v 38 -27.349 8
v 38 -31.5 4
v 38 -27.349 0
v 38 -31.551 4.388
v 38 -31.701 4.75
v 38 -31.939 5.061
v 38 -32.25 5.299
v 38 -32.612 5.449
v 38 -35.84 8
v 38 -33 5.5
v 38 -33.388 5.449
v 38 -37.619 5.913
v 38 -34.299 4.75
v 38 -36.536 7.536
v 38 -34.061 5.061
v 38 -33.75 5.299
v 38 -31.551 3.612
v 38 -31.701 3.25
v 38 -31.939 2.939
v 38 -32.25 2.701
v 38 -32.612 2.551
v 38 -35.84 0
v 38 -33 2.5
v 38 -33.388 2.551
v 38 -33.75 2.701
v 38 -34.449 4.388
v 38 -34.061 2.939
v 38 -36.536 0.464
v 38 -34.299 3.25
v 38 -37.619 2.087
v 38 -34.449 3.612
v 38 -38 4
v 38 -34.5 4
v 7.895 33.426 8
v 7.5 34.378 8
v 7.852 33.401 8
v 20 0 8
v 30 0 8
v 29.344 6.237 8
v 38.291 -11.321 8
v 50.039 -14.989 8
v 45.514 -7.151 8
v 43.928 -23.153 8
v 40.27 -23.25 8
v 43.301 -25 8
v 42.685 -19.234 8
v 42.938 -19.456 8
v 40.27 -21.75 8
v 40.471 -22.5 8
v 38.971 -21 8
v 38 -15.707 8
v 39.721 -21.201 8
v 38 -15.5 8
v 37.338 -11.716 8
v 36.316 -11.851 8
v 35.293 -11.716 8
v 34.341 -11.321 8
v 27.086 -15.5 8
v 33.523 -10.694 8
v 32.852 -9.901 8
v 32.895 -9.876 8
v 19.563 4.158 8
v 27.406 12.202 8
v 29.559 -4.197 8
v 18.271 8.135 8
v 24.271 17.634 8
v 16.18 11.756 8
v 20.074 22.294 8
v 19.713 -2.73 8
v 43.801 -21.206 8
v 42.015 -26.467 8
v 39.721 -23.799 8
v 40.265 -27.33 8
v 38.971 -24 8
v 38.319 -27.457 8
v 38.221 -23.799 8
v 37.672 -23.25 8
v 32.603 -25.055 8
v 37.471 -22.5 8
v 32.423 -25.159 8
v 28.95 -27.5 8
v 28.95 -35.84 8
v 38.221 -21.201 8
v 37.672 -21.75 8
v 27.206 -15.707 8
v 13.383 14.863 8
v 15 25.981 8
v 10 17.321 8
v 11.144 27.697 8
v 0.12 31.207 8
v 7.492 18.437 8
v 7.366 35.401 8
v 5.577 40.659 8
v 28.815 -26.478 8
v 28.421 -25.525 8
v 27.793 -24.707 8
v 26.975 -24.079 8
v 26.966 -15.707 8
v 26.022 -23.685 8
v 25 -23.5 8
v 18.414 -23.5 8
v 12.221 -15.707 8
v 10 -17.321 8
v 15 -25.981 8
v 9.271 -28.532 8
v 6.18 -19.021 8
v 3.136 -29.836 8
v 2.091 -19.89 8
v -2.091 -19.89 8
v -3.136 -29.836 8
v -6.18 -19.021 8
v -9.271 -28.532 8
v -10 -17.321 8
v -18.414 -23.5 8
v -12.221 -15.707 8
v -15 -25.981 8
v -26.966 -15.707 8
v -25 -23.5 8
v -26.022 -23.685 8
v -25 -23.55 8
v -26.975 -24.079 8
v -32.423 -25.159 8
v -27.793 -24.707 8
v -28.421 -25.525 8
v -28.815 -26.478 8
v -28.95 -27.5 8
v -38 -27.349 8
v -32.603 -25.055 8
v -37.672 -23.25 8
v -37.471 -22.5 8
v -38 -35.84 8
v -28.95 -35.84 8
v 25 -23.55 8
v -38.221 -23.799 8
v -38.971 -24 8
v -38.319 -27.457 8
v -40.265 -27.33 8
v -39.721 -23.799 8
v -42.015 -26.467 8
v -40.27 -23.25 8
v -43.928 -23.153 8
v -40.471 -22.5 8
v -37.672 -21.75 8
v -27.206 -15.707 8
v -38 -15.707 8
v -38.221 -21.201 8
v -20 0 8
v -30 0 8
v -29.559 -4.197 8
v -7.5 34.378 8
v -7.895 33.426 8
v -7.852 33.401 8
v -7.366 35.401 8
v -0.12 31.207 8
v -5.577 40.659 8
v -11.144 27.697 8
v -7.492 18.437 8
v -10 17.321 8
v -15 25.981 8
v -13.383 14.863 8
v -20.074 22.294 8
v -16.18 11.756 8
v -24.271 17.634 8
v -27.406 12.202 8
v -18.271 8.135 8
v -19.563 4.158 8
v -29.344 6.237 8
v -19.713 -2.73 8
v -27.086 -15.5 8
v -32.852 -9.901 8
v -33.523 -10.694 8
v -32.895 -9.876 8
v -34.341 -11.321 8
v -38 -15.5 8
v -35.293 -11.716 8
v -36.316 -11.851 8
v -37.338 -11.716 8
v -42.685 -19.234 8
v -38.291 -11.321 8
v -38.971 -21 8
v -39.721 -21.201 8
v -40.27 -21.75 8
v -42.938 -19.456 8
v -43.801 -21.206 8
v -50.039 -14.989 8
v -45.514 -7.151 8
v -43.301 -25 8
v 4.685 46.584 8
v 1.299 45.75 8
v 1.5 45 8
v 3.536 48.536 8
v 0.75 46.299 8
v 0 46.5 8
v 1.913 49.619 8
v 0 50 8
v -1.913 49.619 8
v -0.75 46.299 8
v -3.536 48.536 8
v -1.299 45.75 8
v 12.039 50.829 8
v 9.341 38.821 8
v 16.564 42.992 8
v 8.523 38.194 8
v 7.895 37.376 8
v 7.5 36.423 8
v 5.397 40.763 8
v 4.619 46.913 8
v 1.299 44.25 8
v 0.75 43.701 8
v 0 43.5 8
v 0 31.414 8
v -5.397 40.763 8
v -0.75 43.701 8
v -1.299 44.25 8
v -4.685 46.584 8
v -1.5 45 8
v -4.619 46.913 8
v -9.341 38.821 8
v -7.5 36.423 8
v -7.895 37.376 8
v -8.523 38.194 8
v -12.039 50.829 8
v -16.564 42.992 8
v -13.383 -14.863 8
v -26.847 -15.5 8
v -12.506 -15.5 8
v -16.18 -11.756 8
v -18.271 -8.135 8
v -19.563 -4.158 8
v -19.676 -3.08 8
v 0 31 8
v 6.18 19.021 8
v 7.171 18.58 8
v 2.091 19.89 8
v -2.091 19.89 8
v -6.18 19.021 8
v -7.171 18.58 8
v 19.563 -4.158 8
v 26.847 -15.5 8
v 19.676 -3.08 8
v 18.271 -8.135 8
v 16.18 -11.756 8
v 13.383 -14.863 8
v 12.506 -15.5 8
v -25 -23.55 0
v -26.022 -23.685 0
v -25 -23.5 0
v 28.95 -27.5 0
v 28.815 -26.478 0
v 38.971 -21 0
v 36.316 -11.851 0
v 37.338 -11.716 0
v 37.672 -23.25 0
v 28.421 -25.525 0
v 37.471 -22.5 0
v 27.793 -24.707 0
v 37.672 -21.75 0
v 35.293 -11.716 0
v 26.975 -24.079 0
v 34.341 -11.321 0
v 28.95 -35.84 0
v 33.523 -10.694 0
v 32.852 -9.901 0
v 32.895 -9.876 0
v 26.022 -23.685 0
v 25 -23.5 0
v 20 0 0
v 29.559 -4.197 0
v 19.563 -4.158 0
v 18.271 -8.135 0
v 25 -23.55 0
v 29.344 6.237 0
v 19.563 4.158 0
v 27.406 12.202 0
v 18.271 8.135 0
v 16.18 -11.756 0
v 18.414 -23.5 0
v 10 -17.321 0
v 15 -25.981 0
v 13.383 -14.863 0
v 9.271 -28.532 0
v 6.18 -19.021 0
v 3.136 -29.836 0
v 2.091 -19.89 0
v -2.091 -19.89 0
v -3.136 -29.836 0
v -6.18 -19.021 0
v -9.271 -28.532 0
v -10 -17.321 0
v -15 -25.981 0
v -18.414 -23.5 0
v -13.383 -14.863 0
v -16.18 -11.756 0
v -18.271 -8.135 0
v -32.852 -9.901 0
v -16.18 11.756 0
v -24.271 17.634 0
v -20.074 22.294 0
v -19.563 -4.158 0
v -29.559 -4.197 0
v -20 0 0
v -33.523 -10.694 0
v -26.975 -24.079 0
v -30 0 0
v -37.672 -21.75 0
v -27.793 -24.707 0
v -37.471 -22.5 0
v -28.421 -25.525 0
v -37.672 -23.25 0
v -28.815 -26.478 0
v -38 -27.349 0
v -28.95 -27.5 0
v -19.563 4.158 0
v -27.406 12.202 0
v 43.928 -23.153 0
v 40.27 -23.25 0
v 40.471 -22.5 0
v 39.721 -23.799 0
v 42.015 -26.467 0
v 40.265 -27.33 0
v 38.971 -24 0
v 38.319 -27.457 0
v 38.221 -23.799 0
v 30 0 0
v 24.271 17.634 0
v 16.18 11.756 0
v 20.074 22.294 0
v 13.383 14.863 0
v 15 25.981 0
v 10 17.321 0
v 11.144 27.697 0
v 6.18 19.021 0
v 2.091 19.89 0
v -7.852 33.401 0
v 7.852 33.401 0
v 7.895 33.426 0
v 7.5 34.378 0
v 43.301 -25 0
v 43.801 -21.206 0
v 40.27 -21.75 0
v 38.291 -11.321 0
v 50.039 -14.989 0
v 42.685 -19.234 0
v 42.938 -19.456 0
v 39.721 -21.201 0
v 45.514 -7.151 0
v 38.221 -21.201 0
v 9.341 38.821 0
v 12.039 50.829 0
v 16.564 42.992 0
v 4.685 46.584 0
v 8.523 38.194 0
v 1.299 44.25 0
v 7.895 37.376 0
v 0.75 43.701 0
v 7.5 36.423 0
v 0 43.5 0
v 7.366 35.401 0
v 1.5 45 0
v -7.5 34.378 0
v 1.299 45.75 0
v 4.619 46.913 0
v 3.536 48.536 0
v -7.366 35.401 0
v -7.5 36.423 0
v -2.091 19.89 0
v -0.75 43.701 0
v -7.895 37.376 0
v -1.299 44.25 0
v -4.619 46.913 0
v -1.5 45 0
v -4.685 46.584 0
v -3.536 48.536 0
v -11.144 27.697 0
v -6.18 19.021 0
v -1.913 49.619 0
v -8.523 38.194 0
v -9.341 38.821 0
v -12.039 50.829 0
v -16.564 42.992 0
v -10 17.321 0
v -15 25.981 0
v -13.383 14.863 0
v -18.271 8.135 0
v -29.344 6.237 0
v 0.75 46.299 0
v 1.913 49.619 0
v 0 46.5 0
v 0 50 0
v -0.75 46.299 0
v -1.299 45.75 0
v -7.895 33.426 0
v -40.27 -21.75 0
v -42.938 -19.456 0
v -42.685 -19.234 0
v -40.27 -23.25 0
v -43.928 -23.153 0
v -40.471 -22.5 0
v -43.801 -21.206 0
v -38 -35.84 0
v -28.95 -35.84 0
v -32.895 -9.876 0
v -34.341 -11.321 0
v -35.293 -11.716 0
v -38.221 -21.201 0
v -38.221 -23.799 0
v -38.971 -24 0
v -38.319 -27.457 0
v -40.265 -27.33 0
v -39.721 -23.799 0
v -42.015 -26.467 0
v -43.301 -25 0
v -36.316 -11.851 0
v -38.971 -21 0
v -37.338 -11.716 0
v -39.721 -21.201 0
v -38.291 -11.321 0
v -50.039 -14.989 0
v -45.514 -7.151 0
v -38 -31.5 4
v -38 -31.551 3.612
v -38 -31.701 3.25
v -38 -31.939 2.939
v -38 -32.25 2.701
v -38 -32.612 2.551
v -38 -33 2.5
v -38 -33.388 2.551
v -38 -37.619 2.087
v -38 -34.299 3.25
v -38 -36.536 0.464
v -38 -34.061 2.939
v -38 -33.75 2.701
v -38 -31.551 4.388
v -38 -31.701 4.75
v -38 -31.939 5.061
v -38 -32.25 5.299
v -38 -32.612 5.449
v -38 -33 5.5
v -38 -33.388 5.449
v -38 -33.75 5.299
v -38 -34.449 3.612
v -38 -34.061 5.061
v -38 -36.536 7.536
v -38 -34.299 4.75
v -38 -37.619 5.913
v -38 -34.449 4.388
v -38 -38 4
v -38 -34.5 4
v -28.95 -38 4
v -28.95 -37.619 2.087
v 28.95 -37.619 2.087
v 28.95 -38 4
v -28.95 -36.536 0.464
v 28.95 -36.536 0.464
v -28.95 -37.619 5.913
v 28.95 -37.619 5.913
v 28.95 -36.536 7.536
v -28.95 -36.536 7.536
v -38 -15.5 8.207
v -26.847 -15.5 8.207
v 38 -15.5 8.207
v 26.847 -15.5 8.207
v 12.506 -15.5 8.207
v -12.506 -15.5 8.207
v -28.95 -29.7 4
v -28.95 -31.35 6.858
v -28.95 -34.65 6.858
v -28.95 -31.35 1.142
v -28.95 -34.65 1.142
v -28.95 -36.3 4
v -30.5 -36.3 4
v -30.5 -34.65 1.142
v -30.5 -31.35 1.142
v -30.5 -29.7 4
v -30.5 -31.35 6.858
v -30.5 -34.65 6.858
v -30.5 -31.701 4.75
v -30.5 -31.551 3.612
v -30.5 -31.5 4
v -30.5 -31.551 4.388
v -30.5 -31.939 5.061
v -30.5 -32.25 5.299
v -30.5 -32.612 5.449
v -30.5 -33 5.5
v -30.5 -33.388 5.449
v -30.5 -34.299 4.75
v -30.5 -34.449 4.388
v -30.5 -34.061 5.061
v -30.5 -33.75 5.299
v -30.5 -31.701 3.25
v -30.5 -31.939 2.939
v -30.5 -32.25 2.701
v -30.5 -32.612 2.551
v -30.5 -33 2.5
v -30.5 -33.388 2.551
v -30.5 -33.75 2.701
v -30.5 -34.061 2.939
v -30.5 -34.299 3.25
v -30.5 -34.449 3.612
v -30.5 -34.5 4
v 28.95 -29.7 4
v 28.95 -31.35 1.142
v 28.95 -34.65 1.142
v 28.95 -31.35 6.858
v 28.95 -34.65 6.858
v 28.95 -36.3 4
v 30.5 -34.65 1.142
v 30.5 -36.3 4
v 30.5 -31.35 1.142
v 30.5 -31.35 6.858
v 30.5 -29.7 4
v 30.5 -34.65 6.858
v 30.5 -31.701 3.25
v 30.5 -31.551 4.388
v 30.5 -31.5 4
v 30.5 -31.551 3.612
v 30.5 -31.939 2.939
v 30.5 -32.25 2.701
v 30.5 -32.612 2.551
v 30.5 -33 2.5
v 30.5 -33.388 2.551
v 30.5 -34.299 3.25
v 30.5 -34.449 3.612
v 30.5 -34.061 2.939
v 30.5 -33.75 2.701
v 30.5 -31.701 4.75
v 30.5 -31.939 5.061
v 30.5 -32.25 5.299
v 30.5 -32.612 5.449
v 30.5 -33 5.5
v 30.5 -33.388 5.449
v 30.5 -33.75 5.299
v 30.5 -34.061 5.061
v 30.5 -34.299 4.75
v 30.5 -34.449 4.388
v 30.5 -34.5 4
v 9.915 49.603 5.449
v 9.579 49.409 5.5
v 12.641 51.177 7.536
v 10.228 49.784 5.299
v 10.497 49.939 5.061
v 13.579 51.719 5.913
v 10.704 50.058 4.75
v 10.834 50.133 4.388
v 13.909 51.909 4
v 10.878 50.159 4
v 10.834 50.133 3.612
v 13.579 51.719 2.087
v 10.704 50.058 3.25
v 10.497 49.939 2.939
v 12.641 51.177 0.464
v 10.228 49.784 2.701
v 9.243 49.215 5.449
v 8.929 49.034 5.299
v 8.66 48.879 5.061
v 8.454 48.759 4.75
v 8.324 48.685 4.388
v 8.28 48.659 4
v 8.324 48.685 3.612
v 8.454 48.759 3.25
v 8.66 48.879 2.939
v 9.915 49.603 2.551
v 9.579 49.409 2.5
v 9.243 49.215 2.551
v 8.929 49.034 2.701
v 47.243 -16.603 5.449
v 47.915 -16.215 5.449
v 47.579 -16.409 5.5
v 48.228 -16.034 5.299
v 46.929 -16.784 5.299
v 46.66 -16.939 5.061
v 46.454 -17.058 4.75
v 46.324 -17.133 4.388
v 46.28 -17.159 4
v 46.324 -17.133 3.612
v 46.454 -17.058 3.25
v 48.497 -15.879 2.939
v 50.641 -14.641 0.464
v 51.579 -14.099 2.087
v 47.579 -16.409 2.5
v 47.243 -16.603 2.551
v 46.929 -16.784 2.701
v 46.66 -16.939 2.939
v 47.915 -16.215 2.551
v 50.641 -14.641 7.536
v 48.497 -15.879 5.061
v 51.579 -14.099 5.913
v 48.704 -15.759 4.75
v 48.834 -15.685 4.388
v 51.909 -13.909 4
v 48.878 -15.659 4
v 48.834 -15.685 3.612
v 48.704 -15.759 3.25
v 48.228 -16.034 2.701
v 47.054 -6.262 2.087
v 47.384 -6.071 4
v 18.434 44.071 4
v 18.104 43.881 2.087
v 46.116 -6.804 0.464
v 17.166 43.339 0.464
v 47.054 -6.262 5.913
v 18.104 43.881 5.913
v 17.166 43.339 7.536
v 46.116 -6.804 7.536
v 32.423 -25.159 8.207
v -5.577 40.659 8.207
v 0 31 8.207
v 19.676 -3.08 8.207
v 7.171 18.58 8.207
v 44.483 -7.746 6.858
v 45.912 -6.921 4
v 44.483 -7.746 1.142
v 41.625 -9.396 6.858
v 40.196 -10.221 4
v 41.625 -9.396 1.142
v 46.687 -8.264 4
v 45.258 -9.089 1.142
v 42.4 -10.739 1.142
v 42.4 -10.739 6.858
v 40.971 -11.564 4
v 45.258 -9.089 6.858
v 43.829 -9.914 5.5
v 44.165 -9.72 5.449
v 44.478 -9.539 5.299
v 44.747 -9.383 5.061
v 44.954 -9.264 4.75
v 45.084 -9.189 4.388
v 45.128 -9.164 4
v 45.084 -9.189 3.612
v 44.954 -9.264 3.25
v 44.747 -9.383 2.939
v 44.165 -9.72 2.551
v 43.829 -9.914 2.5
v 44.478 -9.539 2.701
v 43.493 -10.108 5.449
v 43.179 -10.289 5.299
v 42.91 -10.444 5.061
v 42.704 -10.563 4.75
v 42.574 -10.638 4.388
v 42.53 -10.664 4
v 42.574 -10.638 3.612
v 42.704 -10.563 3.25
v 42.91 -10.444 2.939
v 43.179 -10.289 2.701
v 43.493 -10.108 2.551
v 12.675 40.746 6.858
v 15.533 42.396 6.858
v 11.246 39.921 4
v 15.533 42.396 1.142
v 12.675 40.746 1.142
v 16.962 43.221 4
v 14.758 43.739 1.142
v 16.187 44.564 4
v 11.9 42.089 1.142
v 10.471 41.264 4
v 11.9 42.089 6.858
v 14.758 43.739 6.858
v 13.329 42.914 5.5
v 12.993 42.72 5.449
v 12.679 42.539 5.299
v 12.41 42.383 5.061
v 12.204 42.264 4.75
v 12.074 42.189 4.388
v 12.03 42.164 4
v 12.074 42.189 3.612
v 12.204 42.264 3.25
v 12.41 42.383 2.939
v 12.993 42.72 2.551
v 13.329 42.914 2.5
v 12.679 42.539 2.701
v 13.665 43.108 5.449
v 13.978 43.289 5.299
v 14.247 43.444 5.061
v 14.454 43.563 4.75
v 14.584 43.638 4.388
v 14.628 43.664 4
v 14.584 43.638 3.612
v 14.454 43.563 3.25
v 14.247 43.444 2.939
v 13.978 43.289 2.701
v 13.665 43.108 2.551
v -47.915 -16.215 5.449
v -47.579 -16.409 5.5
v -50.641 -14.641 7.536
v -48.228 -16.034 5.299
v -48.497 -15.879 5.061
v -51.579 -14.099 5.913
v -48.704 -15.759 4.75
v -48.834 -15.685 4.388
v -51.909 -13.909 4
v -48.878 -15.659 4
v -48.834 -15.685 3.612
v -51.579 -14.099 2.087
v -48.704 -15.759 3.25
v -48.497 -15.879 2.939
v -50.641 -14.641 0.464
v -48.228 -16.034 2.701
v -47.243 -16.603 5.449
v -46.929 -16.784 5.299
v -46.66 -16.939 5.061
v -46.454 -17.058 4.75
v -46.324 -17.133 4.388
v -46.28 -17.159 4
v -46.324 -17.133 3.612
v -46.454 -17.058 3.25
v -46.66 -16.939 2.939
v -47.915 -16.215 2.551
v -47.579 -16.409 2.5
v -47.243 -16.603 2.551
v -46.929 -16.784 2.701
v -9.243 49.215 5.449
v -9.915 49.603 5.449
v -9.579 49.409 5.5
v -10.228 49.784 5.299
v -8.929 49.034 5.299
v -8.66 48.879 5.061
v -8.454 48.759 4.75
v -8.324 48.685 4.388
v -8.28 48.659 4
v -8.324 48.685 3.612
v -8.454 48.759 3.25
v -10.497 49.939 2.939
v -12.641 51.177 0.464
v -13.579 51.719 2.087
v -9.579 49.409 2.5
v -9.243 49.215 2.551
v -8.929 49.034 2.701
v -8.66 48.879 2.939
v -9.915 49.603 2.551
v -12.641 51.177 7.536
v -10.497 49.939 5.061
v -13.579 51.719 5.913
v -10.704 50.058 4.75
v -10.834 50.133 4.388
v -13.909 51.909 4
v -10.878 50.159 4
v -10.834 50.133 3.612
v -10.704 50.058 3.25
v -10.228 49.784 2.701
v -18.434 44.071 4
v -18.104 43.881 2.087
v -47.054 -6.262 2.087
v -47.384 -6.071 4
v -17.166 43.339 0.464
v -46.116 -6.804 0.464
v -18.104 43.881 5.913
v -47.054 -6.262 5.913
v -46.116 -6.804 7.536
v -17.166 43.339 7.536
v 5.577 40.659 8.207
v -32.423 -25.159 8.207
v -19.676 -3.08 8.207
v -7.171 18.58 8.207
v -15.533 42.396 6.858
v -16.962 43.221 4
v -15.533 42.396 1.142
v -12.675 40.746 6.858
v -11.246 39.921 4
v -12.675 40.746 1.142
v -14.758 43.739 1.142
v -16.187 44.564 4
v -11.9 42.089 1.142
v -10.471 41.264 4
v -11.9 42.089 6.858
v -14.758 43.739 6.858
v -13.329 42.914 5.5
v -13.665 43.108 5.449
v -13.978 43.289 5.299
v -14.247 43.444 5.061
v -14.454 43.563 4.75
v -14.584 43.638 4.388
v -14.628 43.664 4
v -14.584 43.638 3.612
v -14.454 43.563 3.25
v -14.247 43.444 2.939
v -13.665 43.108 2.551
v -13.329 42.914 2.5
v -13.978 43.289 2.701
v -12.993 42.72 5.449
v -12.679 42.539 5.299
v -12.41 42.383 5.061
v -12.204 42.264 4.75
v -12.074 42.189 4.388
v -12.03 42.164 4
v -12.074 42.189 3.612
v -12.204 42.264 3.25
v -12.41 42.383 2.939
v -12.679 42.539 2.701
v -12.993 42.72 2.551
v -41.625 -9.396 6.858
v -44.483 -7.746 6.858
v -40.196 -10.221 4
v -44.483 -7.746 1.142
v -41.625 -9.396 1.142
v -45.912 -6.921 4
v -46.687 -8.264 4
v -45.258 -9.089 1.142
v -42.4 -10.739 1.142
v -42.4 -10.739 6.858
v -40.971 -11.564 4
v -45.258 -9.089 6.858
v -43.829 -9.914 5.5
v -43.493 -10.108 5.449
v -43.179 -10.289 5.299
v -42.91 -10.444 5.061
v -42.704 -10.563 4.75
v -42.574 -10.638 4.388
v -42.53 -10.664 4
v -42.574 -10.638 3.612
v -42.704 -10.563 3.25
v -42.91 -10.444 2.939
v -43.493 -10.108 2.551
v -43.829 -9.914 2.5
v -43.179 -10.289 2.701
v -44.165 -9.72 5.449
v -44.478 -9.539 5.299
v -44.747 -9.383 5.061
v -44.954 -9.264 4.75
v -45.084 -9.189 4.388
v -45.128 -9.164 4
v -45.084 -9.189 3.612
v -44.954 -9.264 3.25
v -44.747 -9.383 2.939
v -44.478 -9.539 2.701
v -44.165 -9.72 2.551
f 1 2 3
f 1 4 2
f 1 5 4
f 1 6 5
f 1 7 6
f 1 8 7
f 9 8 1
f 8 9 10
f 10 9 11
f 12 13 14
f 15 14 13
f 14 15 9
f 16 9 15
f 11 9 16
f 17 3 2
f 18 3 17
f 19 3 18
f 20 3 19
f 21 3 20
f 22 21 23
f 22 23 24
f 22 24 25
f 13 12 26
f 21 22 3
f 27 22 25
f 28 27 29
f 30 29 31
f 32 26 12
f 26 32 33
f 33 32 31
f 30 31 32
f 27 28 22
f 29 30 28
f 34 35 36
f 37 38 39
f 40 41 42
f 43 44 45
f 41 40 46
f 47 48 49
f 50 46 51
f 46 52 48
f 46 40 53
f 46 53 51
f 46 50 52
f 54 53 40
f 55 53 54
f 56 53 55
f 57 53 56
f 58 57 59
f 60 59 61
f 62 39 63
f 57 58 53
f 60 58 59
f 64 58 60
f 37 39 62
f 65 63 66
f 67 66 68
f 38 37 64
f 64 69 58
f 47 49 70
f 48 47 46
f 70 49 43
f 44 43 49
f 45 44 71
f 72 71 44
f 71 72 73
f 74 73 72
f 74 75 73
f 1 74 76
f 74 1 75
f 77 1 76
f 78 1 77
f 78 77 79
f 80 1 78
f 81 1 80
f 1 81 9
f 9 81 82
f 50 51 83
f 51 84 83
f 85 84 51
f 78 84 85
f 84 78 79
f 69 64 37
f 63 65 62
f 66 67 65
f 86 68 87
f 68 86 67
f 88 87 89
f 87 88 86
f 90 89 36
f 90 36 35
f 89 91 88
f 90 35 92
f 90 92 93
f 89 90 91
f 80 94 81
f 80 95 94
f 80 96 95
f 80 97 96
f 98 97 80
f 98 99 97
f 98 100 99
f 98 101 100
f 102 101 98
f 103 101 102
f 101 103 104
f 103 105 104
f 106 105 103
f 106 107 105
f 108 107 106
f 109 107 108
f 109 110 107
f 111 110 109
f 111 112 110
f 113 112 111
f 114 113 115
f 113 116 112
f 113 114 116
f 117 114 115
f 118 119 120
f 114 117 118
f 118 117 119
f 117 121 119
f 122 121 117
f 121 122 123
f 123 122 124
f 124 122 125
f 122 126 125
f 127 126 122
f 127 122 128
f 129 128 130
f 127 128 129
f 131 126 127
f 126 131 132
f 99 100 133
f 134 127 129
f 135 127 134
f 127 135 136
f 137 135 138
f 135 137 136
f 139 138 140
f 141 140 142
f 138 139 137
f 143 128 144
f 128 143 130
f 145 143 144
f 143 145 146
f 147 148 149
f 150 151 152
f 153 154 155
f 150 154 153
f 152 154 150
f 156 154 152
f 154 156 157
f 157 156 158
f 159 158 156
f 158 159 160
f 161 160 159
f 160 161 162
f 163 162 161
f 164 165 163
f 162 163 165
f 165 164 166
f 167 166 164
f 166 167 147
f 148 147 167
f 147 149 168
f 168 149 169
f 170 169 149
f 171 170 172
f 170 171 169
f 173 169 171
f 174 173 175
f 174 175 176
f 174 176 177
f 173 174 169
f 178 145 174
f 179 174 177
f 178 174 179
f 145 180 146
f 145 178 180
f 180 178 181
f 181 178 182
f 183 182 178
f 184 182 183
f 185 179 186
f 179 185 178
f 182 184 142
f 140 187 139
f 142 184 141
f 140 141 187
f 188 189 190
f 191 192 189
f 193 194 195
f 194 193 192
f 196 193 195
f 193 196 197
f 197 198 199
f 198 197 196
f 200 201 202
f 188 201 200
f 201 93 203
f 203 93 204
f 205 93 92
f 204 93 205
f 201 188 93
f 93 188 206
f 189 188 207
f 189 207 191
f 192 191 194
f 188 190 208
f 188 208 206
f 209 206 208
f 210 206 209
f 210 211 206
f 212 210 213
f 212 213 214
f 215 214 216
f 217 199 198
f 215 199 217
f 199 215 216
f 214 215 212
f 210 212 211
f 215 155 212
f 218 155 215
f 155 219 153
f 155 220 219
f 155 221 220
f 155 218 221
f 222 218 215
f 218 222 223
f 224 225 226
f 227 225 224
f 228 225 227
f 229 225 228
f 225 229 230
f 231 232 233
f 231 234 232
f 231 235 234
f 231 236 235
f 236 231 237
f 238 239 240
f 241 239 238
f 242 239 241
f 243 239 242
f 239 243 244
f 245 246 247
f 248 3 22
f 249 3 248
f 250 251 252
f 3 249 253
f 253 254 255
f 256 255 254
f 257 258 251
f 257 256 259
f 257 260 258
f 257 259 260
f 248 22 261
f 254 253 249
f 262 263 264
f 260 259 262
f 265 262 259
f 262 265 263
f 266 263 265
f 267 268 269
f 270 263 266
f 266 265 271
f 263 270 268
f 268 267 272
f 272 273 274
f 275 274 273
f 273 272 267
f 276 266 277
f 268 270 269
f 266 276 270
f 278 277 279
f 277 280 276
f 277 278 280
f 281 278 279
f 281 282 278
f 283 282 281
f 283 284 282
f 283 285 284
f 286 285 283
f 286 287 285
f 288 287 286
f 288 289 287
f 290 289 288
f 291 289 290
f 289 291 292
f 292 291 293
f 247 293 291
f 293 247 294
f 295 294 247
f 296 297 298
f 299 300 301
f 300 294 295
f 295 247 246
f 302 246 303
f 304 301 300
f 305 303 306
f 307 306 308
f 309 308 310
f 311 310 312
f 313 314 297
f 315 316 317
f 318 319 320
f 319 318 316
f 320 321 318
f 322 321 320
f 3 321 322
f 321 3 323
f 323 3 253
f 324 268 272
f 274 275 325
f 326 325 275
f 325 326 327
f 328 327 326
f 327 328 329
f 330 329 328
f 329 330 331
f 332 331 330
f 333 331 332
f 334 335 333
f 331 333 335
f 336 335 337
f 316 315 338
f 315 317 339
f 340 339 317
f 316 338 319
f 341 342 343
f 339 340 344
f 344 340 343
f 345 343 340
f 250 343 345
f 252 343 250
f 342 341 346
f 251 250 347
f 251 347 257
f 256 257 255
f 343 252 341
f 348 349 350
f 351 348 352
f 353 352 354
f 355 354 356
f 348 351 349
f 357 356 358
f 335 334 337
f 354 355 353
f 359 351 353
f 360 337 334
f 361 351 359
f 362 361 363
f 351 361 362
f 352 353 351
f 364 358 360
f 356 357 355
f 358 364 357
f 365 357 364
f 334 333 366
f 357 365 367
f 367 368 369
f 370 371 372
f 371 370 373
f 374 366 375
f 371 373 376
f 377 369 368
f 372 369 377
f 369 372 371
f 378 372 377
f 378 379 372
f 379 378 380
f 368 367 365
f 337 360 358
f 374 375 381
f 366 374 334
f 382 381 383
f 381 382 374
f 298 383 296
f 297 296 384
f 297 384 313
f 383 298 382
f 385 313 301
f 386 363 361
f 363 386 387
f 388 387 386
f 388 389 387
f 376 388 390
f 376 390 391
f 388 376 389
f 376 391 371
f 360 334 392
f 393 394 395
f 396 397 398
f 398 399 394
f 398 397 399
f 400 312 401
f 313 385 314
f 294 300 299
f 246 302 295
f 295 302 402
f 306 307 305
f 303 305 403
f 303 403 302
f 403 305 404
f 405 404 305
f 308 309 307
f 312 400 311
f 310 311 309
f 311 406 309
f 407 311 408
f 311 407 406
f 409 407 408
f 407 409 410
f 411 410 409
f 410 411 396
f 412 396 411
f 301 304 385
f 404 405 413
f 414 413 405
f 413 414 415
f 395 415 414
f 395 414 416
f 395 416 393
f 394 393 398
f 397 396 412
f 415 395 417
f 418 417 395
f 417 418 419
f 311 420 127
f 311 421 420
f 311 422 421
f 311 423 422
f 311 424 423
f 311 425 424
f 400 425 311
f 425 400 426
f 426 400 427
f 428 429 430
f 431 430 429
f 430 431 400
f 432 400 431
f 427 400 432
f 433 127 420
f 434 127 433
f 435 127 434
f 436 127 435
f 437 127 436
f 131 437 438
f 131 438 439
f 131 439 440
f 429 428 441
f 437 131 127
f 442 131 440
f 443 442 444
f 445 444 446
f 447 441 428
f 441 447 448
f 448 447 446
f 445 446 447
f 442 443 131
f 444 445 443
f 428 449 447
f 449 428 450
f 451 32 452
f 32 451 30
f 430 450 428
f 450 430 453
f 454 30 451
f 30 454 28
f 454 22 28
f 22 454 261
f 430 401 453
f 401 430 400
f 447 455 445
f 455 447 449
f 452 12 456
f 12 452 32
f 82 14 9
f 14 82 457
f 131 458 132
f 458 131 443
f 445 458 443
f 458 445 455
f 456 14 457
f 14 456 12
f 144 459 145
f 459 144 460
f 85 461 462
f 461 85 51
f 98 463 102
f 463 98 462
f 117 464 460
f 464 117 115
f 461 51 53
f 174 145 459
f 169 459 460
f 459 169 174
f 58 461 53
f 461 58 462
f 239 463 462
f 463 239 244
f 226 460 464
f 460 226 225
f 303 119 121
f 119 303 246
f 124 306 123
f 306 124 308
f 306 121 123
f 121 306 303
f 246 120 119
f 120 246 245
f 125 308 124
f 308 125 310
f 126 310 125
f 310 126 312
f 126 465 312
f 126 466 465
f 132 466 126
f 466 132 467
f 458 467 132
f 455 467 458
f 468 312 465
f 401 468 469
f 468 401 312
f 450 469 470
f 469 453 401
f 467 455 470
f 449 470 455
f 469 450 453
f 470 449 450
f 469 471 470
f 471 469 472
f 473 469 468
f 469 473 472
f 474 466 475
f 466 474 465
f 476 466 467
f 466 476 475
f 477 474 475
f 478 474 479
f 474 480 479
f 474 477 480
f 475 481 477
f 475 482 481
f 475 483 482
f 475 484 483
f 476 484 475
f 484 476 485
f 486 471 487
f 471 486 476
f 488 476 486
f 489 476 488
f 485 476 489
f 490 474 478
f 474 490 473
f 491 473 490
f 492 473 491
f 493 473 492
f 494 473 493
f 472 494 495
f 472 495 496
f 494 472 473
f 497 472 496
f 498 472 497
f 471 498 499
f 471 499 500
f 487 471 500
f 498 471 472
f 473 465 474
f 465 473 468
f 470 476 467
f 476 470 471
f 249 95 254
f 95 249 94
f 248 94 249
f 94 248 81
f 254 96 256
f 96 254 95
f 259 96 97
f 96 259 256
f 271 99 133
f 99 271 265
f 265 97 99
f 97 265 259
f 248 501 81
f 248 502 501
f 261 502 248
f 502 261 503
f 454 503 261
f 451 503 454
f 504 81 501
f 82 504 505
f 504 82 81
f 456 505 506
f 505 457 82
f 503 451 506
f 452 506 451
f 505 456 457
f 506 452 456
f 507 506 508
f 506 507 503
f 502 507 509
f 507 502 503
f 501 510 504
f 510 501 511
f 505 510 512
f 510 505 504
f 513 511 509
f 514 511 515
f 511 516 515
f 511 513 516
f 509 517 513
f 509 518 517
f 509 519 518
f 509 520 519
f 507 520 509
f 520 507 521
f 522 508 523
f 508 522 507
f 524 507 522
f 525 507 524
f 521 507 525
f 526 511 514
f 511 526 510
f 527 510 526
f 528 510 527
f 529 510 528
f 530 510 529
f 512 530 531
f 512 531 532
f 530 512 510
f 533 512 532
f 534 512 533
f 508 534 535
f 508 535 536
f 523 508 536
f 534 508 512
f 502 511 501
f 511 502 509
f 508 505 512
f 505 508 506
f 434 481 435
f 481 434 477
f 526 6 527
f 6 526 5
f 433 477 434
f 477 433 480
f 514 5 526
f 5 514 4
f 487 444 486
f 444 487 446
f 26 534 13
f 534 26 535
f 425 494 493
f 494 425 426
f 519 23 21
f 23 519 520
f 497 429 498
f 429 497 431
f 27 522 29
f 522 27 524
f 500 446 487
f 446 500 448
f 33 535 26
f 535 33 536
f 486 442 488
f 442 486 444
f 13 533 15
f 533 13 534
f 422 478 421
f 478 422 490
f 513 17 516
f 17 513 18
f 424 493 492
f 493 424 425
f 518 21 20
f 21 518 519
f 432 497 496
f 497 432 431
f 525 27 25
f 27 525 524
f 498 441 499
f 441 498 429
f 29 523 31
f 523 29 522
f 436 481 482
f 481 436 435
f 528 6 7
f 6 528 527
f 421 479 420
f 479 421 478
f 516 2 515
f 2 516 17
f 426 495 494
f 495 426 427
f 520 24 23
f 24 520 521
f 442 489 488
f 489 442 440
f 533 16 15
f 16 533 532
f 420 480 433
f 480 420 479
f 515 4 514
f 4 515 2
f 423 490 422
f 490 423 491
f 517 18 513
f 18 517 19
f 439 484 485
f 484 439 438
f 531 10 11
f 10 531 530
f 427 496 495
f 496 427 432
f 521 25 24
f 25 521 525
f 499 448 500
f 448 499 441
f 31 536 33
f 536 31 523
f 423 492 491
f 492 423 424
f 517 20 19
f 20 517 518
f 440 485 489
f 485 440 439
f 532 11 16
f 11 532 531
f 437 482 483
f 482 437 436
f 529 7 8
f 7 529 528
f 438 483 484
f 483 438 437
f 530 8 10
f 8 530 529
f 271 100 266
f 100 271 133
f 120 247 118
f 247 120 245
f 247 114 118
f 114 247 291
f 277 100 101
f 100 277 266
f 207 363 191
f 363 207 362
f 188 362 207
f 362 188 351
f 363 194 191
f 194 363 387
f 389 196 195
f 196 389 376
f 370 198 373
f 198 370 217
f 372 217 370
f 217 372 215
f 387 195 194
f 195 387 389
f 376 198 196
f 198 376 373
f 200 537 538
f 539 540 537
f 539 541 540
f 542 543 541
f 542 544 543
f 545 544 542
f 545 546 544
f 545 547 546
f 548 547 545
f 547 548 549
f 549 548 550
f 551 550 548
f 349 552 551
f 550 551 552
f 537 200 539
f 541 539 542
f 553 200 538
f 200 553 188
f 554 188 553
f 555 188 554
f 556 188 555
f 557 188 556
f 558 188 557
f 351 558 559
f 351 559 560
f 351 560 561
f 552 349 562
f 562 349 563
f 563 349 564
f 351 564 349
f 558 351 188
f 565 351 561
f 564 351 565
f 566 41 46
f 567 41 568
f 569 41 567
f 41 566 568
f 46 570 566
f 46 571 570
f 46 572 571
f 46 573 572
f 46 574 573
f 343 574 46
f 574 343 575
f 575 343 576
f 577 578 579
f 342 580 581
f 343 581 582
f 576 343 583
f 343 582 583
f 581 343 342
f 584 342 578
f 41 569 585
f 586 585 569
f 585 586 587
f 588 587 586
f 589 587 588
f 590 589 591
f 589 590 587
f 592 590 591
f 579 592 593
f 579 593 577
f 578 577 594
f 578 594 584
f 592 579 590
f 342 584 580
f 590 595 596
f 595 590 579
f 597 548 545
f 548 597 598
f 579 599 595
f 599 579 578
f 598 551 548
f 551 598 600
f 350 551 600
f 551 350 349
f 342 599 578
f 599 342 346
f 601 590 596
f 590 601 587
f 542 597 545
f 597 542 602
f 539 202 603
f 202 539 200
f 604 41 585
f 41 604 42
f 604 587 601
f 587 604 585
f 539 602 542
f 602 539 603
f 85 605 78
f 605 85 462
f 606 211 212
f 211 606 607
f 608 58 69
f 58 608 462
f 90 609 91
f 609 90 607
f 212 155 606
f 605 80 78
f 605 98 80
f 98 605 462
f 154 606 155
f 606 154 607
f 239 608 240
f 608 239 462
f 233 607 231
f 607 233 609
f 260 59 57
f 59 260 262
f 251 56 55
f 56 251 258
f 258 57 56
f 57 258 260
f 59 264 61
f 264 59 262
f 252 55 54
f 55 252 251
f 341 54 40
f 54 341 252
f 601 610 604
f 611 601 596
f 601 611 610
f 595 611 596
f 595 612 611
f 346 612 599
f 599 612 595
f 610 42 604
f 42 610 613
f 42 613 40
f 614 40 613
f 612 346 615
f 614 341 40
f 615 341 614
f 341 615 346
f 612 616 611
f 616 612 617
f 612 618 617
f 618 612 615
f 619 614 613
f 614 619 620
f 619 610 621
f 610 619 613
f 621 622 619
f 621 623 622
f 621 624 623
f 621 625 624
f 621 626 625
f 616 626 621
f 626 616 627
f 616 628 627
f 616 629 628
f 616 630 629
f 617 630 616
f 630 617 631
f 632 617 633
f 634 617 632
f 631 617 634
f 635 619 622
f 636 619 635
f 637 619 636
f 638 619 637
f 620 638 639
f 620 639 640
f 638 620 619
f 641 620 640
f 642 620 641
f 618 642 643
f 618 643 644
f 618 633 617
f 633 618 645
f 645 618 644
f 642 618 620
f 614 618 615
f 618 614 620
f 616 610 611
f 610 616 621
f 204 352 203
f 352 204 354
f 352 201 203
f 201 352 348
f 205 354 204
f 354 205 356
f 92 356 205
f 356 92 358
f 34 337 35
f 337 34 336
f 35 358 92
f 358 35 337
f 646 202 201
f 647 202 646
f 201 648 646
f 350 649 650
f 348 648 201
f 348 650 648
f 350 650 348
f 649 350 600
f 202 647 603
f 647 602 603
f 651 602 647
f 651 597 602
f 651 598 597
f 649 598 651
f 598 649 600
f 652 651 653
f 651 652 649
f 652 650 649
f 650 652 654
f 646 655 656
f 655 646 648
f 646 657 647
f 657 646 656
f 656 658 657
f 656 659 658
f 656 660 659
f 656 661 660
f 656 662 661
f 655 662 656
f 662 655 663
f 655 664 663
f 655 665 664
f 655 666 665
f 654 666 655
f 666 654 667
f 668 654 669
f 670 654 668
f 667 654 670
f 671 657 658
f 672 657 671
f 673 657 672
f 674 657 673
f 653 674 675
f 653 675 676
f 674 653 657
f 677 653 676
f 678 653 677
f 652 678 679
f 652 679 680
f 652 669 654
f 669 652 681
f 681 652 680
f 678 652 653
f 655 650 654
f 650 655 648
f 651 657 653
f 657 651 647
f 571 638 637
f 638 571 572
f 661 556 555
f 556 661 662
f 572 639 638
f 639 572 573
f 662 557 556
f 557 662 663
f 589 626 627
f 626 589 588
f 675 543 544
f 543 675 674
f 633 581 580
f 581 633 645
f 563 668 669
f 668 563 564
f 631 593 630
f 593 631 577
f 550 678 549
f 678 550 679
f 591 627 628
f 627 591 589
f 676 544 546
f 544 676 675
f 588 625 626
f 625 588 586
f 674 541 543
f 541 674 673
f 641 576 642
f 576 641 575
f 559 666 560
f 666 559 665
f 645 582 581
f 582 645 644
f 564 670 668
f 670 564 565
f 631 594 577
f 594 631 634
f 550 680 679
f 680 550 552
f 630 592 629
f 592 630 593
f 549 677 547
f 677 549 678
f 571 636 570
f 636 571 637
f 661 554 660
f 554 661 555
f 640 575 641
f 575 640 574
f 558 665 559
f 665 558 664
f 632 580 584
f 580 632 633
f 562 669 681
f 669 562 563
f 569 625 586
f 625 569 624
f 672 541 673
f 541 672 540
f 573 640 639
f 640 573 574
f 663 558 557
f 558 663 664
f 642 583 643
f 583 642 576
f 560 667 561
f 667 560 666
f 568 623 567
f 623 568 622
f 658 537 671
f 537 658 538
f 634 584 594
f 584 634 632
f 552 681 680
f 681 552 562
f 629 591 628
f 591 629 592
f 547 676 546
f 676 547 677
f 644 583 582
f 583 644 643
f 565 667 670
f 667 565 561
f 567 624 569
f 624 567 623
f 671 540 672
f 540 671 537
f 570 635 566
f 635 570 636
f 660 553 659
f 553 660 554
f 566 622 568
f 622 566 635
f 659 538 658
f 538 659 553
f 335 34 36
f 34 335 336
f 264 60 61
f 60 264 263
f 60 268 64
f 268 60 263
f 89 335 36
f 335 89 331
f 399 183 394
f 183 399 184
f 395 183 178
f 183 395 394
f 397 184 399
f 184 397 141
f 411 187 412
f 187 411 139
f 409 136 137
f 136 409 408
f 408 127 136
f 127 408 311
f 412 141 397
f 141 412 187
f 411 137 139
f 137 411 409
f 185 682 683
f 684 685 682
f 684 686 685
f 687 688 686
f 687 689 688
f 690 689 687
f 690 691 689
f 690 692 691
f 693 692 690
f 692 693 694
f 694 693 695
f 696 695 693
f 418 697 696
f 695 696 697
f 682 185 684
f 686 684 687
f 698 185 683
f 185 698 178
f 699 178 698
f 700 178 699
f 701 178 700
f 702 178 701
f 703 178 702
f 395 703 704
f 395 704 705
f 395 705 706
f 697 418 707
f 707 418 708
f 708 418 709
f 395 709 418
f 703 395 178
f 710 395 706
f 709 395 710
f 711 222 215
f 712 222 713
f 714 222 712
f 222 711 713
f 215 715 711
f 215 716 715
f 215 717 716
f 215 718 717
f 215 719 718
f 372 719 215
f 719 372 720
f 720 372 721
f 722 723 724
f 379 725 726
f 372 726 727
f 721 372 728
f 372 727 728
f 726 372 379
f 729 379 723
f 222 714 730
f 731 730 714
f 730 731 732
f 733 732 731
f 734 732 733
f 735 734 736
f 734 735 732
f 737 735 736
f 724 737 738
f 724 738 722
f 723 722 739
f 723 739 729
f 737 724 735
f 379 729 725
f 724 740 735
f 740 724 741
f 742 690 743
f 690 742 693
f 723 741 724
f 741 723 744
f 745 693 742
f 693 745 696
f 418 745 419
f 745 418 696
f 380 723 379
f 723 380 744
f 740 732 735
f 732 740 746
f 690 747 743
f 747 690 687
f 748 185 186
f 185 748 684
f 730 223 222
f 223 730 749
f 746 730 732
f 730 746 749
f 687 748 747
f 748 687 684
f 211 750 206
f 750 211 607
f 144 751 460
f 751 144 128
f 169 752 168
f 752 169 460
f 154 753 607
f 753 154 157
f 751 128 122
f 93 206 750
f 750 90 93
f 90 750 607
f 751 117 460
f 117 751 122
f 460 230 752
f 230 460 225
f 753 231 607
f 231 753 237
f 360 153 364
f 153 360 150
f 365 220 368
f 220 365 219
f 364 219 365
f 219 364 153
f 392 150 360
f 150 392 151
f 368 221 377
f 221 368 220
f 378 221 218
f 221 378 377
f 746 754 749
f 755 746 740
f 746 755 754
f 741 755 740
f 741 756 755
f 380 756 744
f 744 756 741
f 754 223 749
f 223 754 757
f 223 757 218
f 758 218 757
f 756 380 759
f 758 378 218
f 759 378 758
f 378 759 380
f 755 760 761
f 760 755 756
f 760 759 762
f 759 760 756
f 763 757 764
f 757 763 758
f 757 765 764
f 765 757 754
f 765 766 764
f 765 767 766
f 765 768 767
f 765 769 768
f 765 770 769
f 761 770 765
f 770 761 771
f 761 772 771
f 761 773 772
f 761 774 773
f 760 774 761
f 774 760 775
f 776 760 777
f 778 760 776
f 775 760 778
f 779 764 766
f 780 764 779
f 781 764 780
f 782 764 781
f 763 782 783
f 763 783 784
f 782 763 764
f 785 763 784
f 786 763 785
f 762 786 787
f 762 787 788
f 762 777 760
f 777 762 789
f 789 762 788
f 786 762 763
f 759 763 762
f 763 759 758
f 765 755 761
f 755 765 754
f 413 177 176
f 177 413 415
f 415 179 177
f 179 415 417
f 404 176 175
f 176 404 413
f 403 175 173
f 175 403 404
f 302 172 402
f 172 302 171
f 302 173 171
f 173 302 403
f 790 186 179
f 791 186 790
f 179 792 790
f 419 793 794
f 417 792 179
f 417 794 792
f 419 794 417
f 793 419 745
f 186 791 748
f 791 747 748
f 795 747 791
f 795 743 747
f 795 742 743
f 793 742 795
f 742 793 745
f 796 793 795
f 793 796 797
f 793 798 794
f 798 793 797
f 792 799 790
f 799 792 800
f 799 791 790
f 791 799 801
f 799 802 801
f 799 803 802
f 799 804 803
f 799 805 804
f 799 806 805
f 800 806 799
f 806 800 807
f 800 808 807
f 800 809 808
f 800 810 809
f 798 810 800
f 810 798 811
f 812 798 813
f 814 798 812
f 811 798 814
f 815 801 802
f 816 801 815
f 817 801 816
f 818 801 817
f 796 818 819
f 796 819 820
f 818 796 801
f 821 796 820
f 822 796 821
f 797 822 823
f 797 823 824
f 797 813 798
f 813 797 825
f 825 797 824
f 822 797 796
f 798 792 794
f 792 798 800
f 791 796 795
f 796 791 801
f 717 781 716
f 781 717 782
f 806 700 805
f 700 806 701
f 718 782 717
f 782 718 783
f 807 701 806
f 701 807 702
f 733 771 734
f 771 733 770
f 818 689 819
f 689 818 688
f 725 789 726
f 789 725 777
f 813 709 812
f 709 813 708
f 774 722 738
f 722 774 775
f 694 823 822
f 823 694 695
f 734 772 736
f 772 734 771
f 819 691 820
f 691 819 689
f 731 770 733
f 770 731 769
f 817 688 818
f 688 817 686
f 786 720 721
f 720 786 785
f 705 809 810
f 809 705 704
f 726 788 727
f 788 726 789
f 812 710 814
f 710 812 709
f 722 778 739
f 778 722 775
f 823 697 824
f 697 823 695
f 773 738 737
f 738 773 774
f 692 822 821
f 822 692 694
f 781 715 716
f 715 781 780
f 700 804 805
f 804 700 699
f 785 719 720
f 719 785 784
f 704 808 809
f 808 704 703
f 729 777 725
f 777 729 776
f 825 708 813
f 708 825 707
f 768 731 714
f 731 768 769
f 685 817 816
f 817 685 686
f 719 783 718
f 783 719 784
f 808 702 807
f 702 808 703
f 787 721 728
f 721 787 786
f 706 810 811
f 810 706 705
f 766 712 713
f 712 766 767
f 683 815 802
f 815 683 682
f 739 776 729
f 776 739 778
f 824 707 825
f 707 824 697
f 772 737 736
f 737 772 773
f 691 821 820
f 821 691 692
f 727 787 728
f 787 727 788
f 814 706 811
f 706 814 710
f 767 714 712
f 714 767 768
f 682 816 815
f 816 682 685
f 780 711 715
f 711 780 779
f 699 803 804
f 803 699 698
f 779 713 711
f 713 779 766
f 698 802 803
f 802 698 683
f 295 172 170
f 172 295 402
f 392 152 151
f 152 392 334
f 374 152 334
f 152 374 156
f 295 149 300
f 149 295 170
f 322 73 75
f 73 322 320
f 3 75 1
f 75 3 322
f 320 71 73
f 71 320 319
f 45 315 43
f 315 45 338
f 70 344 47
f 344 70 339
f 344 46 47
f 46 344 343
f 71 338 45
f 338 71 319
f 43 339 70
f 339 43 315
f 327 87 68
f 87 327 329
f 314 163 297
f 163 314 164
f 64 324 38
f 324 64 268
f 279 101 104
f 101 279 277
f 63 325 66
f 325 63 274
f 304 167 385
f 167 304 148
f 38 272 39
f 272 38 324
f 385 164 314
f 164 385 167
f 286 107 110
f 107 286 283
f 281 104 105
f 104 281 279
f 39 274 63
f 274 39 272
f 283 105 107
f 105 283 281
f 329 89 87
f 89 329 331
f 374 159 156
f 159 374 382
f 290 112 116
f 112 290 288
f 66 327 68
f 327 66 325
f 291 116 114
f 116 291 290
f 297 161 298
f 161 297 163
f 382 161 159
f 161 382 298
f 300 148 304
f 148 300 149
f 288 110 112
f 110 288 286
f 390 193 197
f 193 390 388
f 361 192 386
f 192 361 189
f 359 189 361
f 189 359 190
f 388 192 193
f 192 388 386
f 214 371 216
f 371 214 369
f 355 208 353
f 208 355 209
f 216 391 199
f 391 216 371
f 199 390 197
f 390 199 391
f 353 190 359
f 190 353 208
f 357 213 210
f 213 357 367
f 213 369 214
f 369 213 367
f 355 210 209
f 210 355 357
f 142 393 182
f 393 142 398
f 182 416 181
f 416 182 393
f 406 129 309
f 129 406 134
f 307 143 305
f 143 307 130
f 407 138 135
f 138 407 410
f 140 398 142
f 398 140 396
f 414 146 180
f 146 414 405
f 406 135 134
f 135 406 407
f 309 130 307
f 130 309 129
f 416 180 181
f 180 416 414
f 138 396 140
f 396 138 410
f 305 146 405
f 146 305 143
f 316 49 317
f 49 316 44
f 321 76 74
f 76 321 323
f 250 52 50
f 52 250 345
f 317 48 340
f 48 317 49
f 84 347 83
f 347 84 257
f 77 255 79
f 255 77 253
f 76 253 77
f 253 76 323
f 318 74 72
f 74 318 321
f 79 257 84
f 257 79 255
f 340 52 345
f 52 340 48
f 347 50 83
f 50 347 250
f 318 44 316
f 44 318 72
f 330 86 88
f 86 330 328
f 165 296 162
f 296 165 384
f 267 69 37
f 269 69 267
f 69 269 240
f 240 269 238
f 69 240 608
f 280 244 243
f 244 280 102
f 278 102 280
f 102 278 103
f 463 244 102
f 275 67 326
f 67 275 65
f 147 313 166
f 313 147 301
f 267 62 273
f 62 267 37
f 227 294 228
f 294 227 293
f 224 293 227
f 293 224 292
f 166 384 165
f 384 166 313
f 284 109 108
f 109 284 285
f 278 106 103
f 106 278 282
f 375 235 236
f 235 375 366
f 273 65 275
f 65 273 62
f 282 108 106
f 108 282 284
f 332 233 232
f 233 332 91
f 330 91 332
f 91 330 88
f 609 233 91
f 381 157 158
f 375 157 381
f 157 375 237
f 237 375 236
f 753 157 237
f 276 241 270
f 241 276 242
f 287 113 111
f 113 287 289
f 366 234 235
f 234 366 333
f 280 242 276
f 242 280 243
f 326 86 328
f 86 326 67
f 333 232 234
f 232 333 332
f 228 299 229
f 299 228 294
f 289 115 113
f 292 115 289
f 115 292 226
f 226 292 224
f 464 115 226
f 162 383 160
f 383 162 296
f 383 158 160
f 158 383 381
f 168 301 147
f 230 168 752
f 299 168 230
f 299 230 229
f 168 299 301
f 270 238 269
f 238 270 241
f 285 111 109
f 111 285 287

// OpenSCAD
// file: carriage.scad
include <configuration.scad>

width = 76;
height = carriage_height;

offset = 25;
cutout = 7.9;
middle = 2*offset - width/2;

module parallel_joints(reinforced) {
  difference() {
    union() {
      intersection() {
        cube([width, 20, 8], center=true);
        rotate([0, 90, 0]) cylinder(r=5, h=width, center=true);
      }
      intersection() {
        translate([0, 18, 4]) rotate([45, 0, 0])
          cube([width, reinforced, reinforced], center=true);
        translate([0, 0, 20]) cube([width, 35, 40], center=true);
      }
      translate([0, 8, 0]) cube([width, 16, 8], center=true);
    }
    // bolt hole
    rotate([0, 90, 0]) cylinder(r=1.5, h=80, center=true, $fn=24);

    for (x = [-offset, offset]) {
        //arm cut
        translate([x, 5.5, 0])
          cylinder(r=cutout/2, h=100, center=true, $fn=24);
        translate([x, -4.5, 0])
          cube([cutout, 20, 100], center=true);
        
         // nut cutout
        translate([x*1.18, 0, 0]) rotate([0, 90, 0]) rotate([0, 0, 30])
        cylinder(r=3.3, h=2, center=true, $fn=6);
       
     }
     // center cut
    //translate([0, 2, 0]) cylinder(r=middle, h=100, center=true);
    translate([0, -8, 0]) {
        cube([2*middle+26, 35, 100], center=true);
        
    }
  }
}

module lm8uu_mount(d, h) {
  union() {
    difference() {
      intersection() {
        cylinder(r=11, h=h, center=true);
        //translate([0, -8, 0]) cube([19, 13, h+1], center=true);
      }
      cylinder(r=d/2, h=h+1, center=true);
    }
  }
}

module belt_mount() {
  difference() {
    union() {
      difference() {
        translate([8, 2, 0]) cube([4, 13, height], center=true);
        for (z = [-3.5, 3.5])
          translate([8, 5, z])
            cube([5, 13, 3], center=true);
      }
      for (y = [1.5, 5, 8.5]) {
        translate([8, y, 0]) cube([4, 1.2, height], center=true);
      }
    }
  }
}

module carriage() {
  translate([0, 0, height/2]) 
  union() {
    for (x = [-30, 30]) {
      translate([x, 0, 0]) lm8uu_mount(d=15, h=24);
    }
    belt_mount();
    difference() {
      union() {
        translate([0, -5.6, 0])
          cube([50, 5, height], center=true);
        translate([0, -carriage_hinge_offset, -height/2+4])
          parallel_joints(17);
      }
      // Screw hole for adjustable top endstop.
      translate([15, -16, -height/2+4])
        cylinder(r=1.5, h=20, center=true, $fn=12);
      for (x = [-30, 30]) {
        translate([x, 0, 0])
          cylinder(r=8, h=height+1, center=true);
        // Zip tie tunnels.
        //for (z = [-height/2+4, height/2-4])
          //translate([x, 0, z])
            //cylinder(r=13, h=3, center=true);
      }
    }
  }
}

carriage();

// Uncomment the following lines to check endstop alignment.
 //use <idler_end.scad>;
// translate([0, 0, -20]) rotate([180, 0, 0]) idler_end();
// file: configuration.scad
motor_end_height=44;
idler_end_height=40;
carriage_height=24;
platform_thickness=8;
bed_thickness=12;
pcb_thickness=2;
rod_length=120;
smooth_rod_length=300;
tower_radius = 120;
platform_hinge_offset=33;
carriage_hinge_offset=22;
// main file
include <configuration.scad>
use <carriage.scad>

h=platform_thickness;

cutout = 8.3;
inset = 6;

module platform() {
  translate([0, 0, h/2]) 
  difference() {
    union() {
      for (a = [0:120:359]) {
        rotate([0, 0, a]) {
          translate([0, -platform_hinge_offset, 0]) parallel_joints();
          // Close little triangle holes.
          translate([0, 31, 0]) cylinder(r=5, h=h, center=true);
          // Holder for adjustable bottom endstops.
          translate([0, 45, 0]) cylinder(r=5, h=h, center=true);
        }
      }
      cylinder(r=30, h=h, center=true);
    }
    cylinder(r=20, h=h+12, center=true);
    for (a = [0:2]) {
      rotate(a*120) {
        // Extruder mount holes
          //  translate([0, -25, 0])
         // #cylinder(r=2.2, h=h+1, center=true, $fn=12);
        // Screw holes for adjustable bottom endstops.
        translate([0, 45, 0])
          cylinder(r=1.5, h=h+1, center=true, $fn=12);
      }
    }
  }
}

platform();
